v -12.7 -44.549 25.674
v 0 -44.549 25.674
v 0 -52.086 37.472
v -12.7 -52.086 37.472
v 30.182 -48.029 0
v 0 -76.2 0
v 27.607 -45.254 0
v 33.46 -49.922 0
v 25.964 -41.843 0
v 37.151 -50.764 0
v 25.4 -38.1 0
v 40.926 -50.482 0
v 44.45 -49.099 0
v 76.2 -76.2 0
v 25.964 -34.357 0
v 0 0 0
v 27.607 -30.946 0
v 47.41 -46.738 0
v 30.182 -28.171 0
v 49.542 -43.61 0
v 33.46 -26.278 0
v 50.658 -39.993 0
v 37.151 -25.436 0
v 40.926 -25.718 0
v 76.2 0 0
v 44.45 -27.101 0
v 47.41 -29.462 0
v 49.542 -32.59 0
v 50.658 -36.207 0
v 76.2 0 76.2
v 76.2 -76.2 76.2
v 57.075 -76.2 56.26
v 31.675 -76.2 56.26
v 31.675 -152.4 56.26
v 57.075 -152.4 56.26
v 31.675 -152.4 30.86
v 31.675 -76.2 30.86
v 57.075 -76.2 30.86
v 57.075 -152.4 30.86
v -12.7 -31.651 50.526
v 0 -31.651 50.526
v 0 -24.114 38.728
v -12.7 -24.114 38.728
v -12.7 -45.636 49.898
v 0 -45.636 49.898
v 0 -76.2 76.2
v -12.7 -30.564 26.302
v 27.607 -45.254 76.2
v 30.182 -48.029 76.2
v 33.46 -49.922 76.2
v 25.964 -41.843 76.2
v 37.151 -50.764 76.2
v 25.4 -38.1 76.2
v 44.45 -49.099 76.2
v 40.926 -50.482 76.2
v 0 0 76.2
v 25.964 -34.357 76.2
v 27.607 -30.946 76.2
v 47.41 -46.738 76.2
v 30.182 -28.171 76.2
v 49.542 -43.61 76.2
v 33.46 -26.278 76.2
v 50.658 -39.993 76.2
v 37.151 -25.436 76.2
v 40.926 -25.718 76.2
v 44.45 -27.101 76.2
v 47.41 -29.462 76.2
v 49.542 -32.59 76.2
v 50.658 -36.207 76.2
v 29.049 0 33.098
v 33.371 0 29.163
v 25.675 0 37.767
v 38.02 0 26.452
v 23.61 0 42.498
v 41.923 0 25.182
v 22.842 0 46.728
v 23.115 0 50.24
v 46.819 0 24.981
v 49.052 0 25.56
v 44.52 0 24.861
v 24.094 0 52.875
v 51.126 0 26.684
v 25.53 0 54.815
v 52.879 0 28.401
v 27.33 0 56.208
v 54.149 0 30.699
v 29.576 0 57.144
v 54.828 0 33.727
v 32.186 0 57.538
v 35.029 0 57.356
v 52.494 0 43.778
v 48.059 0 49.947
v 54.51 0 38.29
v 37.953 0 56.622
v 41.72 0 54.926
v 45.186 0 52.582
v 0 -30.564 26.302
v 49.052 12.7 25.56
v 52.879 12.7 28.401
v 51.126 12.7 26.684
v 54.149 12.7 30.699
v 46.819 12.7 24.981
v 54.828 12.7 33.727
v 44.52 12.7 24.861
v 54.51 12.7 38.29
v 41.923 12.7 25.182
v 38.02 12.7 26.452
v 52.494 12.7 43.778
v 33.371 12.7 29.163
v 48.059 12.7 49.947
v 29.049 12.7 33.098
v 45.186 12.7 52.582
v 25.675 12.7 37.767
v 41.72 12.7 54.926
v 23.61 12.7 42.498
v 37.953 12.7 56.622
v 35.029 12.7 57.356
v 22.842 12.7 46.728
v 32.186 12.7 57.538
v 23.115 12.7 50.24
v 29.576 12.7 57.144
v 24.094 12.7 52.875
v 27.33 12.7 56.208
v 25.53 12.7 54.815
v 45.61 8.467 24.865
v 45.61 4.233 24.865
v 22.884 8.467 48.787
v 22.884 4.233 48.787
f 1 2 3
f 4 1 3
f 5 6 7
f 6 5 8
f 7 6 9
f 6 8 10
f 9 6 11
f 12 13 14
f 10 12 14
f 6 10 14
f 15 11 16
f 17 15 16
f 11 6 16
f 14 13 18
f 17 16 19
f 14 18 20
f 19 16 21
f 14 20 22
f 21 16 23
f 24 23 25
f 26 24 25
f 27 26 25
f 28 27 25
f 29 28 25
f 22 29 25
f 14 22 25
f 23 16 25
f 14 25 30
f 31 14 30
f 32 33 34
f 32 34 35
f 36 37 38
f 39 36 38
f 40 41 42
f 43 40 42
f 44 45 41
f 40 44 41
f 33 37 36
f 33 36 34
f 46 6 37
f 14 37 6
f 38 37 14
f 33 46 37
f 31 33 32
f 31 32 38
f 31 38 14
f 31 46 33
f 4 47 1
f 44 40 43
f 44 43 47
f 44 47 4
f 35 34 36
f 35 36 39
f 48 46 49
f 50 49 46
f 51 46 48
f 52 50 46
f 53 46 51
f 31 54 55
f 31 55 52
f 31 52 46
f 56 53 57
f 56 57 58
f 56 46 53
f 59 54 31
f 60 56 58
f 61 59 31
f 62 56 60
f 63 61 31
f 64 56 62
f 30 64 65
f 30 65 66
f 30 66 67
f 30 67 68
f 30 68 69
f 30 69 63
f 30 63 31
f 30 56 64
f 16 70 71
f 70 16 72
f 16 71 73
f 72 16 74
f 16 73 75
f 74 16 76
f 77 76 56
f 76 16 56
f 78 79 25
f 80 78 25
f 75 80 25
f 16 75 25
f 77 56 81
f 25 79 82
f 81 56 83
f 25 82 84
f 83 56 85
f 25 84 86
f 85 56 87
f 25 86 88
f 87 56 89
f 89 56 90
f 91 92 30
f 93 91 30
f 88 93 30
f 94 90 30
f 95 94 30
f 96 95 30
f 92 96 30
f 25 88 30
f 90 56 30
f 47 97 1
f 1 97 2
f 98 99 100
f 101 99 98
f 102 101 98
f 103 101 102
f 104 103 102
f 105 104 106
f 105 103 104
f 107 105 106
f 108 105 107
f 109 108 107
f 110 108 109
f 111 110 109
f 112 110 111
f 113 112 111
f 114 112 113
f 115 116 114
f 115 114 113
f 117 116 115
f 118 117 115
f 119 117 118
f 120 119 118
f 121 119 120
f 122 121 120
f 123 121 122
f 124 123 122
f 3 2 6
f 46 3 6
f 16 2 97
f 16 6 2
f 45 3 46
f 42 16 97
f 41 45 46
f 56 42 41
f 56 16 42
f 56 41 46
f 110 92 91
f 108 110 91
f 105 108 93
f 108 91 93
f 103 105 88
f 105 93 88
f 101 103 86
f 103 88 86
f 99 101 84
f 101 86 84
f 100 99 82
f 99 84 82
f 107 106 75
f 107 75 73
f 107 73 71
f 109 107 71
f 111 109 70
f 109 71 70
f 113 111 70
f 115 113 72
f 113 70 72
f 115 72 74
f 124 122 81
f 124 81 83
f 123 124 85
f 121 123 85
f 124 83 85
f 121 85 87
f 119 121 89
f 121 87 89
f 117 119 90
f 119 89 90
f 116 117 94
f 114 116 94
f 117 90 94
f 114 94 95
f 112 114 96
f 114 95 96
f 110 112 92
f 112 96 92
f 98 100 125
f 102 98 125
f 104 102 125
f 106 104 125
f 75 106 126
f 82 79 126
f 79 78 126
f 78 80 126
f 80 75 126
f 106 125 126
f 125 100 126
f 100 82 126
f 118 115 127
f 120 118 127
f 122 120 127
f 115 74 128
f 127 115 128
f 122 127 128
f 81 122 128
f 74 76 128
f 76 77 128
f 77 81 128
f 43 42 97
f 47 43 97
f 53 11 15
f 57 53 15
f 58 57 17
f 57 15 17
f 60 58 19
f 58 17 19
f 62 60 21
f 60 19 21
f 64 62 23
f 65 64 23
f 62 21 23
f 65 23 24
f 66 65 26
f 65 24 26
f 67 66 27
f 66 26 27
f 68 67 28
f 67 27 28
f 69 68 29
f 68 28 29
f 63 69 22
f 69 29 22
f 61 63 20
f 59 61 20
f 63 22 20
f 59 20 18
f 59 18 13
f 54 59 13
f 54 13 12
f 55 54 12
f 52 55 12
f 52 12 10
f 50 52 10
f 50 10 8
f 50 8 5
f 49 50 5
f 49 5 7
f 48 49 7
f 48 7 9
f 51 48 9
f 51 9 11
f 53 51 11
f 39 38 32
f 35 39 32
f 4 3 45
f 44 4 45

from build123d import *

# Parameters (mm, degrees)
F0_W      = 76.2
F0_H      = 76.2
F1_DEPTH  = 76.2
F3_D      = 25.4
F4_W      = 25.4
F4_H      = 25.4
F5_DEPTH  = 76.2
F10_DEPTH = 12.7
F12_DEPTH = 12.7


# Not quite as in the source:
# - the program builds the solid bodies; features that only make, move or delete a surface that nothing else refers to are left out


with BuildPart() as f1:
    # F0 (on Front) → F1 (new body)
    with BuildSketch(Plane.XZ):
        with Locations((38.1, 38.1)):
            Rectangle(F0_W, F0_H)
    extrude(amount=F1_DEPTH)

    # F3 (through all)
    with Locations(Plane.XY.offset(76.2)):
        with Locations((38.1, -38.1)):
            Hole(F3_D / 2)

    # F4 (on face) → F5 (join)
    with BuildSketch(Plane.XZ.offset(76.2)):
        with Locations((44.375465405, 43.5601483703)):
            Rectangle(F4_W, F4_H)
    extrude(amount=F5_DEPTH)

    # F9 (on face) → F10 (join)
    with BuildSketch(Plane(origin=(0, 0, 0), x_dir=(0, -1, 0), z_dir=(-1, 0, 0))):
        Polygon((52.085519187, 37.4724815469), (45.6362065152, 49.8980556745), (31.6506873282, 50.5255741276), (24.114480813, 38.7275184531), (30.5637934848, 26.3019443255), (44.5493126718, 25.6744258724), align=None)
    extrude(amount=F10_DEPTH)

    # F11 (on face) → F12 (join)
    with BuildSketch(Plane(origin=(0, 0, 0), x_dir=(-1, 0, 0), z_dir=(0, 1, 0))):
        with BuildLine():
            add(Edge.make_bspline(
                [(-48.0585680543, 49.9470105327), (-70.7842466593, 26.0252415357), (-45.6101675869, 24.8654493741), (-20.4360885145, 23.7056572126), (-22.884488982, 48.7872183711), (-25.3328894494, 73.8687795297), (-48.0585680543, 49.9470105327)],
                knots=[4.7123889804, 4.7123889804, 4.7123889804, 6.8067840828, 6.8067840828, 8.9011791852, 8.9011791852, 10.9955742876, 10.9955742876, 10.9955742876], degree=2, weights=[1, 0.5, 1, 0.5, 1, 0.5, 1]))
        make_face()
    extrude(amount=F12_DEPTH)


solid = f1.part
